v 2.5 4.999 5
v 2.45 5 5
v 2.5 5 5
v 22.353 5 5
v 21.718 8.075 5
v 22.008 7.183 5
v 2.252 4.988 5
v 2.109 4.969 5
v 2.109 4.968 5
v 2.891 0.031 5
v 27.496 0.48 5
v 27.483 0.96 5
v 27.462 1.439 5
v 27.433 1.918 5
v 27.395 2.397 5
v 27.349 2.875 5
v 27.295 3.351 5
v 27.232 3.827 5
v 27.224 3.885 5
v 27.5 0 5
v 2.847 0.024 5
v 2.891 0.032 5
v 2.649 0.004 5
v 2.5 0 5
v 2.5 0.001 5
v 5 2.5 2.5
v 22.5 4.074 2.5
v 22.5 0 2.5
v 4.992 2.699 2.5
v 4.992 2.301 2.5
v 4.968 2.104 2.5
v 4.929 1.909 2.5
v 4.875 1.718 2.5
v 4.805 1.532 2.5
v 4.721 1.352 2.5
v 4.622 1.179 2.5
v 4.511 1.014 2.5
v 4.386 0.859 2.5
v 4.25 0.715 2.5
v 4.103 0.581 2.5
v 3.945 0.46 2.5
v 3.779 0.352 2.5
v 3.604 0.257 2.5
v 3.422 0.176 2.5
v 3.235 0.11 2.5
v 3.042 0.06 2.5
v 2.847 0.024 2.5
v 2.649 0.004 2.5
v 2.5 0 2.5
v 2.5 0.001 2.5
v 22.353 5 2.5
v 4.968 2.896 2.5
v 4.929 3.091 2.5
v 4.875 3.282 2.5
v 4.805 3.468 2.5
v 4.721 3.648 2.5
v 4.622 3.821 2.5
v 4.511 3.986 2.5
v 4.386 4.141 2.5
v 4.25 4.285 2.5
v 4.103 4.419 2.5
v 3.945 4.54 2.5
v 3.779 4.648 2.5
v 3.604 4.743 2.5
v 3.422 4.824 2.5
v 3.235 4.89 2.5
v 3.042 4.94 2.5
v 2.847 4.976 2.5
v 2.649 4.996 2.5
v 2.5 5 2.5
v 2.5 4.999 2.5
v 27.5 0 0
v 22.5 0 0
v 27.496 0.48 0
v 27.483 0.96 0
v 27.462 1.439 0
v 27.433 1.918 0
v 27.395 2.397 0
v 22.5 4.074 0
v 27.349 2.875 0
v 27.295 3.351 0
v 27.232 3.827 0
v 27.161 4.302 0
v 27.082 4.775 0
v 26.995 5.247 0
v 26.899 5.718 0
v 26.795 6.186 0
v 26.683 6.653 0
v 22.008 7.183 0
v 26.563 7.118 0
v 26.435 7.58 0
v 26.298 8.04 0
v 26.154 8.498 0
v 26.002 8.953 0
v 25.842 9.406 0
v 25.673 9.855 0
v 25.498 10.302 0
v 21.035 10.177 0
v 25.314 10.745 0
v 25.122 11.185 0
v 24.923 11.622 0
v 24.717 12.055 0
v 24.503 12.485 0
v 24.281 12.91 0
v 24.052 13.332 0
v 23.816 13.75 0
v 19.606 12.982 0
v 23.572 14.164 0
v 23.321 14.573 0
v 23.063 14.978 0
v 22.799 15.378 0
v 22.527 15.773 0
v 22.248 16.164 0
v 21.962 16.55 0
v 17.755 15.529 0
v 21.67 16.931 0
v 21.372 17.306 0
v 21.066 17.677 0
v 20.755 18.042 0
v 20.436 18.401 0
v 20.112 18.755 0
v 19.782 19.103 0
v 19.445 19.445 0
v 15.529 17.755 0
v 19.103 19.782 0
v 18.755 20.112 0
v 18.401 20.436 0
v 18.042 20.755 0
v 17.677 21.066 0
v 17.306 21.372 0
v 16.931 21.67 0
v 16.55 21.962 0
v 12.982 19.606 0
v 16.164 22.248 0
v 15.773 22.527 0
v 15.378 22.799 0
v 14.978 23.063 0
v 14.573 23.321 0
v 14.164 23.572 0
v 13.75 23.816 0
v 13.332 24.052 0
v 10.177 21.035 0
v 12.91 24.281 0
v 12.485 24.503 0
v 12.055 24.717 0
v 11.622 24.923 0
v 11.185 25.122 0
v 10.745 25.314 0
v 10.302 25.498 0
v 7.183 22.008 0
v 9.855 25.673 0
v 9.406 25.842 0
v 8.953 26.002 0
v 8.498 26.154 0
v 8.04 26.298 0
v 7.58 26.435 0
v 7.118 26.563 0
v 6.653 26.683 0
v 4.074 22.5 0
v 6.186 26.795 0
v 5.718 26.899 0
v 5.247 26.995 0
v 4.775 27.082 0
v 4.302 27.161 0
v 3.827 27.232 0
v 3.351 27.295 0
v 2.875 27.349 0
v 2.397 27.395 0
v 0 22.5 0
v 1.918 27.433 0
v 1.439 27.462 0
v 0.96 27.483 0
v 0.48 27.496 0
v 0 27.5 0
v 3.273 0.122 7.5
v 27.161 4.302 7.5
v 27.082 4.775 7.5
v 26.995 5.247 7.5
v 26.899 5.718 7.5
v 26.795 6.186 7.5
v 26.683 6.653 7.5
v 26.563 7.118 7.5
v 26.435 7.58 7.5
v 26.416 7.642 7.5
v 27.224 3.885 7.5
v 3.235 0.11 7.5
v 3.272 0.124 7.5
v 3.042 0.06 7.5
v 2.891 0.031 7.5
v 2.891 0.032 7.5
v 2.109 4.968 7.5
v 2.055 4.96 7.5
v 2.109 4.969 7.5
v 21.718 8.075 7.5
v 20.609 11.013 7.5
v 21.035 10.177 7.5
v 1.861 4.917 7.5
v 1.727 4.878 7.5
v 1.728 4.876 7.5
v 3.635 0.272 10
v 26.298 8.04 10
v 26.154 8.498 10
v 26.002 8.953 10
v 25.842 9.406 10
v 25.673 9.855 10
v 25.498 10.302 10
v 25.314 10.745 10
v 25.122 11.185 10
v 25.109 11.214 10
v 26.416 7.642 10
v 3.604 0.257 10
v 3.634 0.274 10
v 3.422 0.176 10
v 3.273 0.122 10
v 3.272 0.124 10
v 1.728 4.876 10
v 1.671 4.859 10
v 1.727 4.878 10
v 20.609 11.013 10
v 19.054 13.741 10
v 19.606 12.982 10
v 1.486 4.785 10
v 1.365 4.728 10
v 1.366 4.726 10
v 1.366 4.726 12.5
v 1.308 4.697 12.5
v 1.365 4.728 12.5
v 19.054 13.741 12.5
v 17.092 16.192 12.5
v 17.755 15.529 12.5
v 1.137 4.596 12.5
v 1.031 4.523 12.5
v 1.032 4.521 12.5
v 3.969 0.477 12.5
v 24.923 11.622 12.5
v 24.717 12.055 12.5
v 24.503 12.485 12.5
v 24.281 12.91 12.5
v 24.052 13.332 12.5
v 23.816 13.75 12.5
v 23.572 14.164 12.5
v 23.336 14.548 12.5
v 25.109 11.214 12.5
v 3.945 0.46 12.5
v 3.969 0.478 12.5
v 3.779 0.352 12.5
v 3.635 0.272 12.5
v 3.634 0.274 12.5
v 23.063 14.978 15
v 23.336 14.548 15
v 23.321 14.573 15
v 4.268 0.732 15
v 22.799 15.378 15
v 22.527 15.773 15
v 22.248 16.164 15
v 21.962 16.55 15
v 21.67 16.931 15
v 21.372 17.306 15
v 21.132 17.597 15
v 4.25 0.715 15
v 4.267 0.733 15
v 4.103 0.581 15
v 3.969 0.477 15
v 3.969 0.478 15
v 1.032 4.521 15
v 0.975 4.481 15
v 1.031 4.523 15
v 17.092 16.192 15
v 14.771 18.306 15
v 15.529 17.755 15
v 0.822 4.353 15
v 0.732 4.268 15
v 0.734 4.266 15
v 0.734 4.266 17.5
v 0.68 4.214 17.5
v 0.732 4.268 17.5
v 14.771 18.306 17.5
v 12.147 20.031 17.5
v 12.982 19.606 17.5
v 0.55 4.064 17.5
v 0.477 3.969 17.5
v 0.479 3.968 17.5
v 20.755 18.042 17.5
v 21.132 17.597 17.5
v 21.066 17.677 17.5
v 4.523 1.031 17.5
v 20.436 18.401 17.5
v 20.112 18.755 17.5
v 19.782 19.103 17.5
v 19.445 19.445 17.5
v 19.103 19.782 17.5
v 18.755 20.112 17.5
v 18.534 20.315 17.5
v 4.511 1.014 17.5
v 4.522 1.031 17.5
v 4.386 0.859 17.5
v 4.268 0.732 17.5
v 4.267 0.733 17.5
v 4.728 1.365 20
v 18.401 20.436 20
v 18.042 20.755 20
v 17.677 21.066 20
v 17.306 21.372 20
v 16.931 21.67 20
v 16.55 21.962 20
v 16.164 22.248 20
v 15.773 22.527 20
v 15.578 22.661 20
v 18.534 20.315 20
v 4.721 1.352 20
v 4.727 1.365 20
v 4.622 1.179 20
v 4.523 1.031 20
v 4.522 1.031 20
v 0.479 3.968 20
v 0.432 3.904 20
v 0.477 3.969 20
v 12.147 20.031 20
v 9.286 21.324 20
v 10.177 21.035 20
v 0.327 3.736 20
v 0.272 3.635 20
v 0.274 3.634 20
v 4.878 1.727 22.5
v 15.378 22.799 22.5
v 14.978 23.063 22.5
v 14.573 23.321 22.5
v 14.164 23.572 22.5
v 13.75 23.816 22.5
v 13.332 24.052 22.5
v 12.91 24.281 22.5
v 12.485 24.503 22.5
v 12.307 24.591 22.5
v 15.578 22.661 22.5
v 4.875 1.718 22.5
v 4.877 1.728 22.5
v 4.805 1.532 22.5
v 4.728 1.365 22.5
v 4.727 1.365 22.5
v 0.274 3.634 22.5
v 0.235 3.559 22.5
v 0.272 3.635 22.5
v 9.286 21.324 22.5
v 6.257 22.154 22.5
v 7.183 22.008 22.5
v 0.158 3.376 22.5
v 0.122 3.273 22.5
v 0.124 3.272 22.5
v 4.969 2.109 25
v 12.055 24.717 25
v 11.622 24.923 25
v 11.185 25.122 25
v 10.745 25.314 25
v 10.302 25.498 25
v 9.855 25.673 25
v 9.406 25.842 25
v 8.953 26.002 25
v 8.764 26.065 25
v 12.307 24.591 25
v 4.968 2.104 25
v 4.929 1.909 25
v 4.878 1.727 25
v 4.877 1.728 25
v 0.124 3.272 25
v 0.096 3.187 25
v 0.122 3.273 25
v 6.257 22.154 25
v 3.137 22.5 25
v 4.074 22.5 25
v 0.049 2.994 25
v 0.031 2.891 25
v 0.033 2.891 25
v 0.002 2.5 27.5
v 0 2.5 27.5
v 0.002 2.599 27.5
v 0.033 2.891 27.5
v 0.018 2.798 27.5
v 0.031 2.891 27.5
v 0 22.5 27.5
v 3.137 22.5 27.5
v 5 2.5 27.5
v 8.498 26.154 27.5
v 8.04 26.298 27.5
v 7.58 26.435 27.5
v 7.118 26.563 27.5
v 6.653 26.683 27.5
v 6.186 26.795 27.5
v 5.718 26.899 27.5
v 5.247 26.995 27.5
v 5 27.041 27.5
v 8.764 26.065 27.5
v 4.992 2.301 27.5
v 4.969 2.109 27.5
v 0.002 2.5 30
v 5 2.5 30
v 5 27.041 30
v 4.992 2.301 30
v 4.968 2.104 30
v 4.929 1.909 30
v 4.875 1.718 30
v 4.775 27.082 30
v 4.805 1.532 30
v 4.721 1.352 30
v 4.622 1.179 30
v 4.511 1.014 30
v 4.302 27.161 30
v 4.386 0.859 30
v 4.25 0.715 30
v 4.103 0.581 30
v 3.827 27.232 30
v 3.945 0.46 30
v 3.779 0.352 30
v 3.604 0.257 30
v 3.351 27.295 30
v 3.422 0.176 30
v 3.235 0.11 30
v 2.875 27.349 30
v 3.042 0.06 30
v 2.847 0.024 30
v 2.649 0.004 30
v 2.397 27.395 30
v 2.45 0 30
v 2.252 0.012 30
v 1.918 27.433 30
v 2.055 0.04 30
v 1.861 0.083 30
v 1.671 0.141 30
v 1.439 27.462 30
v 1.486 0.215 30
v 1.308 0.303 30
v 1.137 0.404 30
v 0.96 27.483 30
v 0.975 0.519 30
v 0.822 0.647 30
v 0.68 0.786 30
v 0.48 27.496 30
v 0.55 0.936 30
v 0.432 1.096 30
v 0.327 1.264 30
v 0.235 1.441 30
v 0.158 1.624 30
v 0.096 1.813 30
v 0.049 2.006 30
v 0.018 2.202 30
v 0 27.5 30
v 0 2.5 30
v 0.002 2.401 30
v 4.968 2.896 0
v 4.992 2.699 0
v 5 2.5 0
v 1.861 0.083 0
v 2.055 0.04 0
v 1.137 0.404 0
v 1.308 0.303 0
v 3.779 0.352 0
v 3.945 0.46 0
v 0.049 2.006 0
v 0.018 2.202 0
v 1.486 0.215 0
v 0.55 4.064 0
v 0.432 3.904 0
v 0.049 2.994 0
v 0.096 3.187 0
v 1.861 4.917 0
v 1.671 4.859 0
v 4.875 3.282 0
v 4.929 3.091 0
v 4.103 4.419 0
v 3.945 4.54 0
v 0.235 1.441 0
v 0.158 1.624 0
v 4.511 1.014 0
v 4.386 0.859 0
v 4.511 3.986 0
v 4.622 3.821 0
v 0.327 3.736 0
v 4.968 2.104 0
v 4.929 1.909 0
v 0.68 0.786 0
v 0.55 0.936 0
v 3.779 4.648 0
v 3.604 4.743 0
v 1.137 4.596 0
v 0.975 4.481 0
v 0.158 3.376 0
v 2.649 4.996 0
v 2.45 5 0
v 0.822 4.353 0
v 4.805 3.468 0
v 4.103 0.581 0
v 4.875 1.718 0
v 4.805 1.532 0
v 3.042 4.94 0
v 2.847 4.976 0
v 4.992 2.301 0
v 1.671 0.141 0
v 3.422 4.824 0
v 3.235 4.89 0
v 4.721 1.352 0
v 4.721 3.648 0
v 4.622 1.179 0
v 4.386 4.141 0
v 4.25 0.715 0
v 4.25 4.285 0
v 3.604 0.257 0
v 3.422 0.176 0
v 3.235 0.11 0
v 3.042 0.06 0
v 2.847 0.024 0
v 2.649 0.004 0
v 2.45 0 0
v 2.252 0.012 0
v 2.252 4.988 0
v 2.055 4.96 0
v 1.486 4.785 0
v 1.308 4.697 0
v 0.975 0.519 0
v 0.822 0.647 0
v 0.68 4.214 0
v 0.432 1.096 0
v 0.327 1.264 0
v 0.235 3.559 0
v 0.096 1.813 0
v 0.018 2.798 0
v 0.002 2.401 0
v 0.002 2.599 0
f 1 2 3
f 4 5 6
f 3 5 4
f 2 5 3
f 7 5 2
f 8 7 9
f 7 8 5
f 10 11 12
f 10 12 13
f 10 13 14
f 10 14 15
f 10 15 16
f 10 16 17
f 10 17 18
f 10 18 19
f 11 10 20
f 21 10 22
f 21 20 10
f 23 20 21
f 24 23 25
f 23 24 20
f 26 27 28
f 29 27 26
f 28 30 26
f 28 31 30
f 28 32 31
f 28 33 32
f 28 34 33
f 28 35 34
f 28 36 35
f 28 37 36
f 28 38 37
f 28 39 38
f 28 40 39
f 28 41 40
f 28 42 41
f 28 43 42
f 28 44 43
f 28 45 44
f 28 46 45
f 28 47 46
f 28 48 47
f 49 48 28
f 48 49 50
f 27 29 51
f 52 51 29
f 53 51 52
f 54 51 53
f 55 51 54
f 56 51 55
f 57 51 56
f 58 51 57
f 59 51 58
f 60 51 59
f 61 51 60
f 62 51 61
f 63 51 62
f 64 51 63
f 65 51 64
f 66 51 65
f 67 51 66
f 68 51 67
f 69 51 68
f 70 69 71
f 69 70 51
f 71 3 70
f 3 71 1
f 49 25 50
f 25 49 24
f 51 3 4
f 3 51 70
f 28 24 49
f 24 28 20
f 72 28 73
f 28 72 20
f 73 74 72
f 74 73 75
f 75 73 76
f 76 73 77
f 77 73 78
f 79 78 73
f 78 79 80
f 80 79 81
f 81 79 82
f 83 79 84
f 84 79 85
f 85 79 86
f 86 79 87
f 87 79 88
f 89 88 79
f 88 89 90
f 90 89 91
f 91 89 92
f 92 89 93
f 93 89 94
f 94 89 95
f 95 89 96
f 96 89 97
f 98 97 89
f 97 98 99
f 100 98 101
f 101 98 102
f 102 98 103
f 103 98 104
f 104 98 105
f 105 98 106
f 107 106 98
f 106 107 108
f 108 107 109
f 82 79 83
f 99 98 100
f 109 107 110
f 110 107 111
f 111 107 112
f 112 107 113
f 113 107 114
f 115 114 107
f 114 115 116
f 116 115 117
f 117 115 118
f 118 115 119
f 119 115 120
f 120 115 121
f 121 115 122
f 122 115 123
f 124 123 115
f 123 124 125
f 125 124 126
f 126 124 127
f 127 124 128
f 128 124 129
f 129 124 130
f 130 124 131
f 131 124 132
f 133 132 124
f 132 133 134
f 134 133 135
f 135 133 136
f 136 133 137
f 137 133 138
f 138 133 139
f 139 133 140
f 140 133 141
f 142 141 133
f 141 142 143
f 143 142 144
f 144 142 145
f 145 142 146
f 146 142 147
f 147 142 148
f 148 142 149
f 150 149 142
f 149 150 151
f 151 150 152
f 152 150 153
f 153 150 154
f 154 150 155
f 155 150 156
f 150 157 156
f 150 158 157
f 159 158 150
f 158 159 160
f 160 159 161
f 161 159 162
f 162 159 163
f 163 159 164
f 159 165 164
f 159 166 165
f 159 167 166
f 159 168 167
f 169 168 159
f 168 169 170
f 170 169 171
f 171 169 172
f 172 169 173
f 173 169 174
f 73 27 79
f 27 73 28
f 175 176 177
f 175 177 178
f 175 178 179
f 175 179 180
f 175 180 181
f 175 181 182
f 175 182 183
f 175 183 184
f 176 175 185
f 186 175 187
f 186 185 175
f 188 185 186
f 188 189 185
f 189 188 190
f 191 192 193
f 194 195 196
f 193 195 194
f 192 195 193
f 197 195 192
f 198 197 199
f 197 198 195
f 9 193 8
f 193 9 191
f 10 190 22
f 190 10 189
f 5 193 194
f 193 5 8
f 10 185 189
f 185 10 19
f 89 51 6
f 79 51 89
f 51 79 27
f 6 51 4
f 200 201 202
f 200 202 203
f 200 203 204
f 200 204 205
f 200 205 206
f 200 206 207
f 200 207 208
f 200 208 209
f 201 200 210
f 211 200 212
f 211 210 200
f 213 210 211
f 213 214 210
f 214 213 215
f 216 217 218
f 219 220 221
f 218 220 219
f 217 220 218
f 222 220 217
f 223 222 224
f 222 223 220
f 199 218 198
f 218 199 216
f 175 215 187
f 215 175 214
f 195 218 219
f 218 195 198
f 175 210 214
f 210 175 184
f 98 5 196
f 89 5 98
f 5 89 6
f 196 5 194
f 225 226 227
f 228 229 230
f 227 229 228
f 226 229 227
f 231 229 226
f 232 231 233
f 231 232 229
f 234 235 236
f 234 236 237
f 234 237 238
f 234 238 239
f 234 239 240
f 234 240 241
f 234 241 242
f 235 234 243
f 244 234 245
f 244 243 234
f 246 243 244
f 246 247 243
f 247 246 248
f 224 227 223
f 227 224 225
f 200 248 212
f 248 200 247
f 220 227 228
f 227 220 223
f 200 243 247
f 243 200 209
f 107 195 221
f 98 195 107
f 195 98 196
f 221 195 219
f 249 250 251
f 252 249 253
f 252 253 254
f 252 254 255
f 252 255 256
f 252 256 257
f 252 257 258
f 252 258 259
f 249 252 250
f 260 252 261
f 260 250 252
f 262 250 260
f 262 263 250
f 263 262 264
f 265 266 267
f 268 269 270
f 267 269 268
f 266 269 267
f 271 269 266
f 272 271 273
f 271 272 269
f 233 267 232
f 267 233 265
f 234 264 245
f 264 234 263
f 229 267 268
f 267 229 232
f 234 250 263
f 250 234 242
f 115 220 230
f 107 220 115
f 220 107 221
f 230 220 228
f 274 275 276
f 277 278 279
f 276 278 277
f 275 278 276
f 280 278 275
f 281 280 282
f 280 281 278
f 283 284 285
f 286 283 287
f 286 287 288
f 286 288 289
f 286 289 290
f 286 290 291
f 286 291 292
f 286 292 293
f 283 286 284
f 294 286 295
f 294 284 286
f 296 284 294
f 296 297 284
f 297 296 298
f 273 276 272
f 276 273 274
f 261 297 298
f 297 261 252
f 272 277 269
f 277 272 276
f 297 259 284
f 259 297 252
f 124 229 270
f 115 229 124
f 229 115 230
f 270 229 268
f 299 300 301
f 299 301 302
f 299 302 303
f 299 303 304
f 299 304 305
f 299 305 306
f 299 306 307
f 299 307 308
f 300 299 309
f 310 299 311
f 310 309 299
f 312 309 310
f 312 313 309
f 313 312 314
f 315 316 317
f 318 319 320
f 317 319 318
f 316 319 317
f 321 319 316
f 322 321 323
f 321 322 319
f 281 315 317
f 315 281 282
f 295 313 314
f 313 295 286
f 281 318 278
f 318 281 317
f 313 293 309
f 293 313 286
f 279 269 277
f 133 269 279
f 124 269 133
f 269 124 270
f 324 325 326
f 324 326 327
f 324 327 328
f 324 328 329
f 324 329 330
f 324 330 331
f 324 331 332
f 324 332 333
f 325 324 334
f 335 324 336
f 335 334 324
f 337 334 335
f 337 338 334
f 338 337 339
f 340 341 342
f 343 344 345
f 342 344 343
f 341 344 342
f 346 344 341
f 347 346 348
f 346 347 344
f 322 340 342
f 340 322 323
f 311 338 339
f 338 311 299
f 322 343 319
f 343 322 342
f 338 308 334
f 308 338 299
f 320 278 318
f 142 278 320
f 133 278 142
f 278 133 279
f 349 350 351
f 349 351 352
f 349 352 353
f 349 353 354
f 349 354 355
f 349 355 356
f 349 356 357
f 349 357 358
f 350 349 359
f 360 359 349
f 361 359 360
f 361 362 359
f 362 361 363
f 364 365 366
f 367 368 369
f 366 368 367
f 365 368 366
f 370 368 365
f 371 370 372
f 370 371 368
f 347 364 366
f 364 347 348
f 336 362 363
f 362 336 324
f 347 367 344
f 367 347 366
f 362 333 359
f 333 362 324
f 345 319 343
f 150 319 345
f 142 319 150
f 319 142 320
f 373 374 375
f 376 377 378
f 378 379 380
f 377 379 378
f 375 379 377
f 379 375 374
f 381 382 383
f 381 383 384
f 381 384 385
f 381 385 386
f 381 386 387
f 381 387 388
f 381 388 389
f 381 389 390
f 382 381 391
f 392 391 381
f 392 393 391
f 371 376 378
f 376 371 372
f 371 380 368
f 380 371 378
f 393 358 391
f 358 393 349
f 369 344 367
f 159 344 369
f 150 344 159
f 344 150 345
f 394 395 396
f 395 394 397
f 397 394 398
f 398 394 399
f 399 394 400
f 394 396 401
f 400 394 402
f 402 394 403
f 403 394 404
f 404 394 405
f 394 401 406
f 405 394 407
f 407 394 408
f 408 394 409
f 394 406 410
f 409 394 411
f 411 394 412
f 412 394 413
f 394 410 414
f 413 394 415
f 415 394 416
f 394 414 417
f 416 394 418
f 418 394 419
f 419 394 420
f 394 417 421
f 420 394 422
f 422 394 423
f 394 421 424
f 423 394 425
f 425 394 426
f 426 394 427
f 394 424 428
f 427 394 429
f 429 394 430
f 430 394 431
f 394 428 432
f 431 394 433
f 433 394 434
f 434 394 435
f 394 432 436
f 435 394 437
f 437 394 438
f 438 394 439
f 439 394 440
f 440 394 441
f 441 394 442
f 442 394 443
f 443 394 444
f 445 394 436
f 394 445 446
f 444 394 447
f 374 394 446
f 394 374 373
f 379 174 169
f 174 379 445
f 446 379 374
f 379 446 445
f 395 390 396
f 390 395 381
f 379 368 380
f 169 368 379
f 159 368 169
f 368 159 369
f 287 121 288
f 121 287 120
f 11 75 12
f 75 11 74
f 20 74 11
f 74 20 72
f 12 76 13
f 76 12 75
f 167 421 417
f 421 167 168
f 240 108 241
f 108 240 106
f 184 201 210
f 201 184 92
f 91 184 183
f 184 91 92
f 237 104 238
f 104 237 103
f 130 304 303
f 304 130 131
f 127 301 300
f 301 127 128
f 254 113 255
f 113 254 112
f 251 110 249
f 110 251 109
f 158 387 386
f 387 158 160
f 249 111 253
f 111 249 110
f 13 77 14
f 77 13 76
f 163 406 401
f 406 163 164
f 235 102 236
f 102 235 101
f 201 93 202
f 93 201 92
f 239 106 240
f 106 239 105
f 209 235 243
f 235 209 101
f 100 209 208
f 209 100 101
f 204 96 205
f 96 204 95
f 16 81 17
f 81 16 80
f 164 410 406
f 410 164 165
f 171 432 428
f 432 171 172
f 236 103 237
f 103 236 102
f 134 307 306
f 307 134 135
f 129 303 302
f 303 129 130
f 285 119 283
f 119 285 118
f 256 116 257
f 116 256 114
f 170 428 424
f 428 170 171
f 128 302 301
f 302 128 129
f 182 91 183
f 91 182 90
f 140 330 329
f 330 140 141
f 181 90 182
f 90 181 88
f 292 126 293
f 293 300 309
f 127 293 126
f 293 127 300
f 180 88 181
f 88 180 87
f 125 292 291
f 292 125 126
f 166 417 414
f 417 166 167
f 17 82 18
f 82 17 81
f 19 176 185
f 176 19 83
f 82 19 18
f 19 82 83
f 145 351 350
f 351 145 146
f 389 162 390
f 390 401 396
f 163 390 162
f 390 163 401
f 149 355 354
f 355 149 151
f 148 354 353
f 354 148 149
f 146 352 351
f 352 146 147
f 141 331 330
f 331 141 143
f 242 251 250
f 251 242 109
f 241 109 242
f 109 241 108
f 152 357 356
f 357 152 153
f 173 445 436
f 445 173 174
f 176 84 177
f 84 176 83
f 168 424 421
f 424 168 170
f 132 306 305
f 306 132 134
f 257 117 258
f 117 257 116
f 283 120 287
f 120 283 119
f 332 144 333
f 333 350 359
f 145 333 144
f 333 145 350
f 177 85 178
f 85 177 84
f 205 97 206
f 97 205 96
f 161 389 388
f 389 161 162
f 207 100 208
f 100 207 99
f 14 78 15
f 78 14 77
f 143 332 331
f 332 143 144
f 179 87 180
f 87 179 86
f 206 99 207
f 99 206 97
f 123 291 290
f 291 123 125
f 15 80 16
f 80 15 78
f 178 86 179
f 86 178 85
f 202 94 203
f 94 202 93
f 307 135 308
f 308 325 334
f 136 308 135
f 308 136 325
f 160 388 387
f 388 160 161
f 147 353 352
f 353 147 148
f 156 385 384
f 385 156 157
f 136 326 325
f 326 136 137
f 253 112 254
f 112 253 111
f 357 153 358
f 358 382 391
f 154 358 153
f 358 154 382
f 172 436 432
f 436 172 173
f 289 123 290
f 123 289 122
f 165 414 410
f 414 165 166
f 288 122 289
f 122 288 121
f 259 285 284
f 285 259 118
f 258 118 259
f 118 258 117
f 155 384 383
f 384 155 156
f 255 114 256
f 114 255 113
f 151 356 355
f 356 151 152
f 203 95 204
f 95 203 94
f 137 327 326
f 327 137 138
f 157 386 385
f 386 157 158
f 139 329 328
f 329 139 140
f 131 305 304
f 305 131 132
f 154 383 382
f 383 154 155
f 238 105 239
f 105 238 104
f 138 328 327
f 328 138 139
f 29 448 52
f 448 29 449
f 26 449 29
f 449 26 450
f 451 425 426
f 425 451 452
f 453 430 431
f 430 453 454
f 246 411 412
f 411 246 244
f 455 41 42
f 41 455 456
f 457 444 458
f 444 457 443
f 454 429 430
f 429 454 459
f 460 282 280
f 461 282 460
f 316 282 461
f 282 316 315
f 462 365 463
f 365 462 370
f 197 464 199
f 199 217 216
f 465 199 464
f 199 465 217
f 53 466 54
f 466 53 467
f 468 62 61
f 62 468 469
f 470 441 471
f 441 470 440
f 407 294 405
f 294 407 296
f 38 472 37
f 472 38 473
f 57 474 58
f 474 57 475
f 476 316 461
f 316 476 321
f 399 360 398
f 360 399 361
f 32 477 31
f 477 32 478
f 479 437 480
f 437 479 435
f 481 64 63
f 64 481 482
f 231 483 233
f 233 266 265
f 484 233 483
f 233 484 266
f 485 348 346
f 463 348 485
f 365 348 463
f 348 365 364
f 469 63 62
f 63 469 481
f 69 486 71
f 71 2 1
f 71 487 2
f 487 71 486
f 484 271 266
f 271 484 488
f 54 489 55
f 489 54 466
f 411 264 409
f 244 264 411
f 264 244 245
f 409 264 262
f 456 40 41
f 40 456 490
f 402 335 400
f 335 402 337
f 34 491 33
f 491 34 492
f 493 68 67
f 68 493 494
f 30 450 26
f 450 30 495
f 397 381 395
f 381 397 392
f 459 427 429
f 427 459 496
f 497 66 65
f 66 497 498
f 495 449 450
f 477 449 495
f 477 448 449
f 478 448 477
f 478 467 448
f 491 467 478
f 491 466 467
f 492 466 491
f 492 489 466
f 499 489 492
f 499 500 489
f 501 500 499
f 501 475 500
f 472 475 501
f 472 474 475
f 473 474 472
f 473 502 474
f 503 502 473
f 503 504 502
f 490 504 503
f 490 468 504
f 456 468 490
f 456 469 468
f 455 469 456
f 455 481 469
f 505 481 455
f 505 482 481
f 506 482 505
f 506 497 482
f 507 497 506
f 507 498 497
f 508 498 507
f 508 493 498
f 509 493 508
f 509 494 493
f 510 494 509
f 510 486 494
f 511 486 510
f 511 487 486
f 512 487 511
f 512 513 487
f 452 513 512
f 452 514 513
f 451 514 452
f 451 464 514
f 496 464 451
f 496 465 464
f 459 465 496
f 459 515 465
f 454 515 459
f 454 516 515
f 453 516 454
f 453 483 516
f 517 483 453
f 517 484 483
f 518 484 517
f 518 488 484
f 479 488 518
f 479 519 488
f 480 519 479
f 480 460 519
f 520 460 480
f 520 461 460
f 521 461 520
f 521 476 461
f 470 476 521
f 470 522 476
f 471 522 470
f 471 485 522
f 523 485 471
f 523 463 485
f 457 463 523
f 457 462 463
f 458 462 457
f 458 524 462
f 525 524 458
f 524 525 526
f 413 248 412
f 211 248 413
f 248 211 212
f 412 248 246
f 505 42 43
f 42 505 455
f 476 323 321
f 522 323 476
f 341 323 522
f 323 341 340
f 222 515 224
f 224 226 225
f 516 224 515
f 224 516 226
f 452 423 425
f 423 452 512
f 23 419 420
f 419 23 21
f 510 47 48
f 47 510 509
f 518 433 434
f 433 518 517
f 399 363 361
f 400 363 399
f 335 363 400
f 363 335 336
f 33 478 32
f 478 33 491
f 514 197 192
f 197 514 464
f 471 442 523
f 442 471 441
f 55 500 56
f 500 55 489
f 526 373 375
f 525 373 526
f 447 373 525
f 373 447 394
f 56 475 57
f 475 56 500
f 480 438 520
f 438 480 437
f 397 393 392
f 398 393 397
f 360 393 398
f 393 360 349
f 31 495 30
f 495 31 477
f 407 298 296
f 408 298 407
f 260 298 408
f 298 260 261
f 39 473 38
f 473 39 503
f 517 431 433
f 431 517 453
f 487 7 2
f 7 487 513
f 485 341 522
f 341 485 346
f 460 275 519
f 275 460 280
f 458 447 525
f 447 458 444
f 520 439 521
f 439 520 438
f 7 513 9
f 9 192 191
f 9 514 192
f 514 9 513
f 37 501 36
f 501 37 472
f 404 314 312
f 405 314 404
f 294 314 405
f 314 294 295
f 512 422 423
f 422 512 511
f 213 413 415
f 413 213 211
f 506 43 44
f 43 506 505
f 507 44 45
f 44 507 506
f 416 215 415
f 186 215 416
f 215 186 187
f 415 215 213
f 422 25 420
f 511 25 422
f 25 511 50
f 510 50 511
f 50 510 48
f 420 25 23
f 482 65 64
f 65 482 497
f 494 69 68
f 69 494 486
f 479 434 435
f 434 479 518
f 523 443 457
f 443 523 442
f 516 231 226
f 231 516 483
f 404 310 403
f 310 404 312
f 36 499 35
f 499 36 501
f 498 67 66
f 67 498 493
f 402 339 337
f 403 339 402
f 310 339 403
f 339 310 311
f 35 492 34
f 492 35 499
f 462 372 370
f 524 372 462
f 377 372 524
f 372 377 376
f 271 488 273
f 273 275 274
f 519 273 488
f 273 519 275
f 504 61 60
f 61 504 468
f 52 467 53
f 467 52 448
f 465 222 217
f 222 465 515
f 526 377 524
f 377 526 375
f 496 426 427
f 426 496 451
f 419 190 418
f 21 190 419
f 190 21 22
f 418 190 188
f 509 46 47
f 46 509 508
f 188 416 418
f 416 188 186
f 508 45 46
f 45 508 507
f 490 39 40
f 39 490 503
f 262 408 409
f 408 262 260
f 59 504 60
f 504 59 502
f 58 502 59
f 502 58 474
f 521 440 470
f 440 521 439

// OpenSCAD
thickness = 5;
steps = 10;
height = 30;
width = 20;
$fs = 0.2;
$fa = 1;

translate([thickness / 2, thickness / 2, 0]) {
	cylinder(r=thickness / 2, h=height);
}

intersection() {
	union() {
		translate([thickness / 2, thickness / 2, 0]) {
			for(step = [0:steps]) {
				rotate([0, 0, 90 / steps * step]) {
					translate([0, -thickness / 2, height / (steps + 2) * (step + 1)]) {
						cube([width + thickness, thickness, height / (steps + 2)]);
					}
					translate([width, -thickness / 2, 0]) {
						cube([thickness, thickness, height / (steps + 2) * (step + 2)]);
					}
				}
			}
		}
	}
	cylinder(r=width + thickness * 1.5, h=height);
}
